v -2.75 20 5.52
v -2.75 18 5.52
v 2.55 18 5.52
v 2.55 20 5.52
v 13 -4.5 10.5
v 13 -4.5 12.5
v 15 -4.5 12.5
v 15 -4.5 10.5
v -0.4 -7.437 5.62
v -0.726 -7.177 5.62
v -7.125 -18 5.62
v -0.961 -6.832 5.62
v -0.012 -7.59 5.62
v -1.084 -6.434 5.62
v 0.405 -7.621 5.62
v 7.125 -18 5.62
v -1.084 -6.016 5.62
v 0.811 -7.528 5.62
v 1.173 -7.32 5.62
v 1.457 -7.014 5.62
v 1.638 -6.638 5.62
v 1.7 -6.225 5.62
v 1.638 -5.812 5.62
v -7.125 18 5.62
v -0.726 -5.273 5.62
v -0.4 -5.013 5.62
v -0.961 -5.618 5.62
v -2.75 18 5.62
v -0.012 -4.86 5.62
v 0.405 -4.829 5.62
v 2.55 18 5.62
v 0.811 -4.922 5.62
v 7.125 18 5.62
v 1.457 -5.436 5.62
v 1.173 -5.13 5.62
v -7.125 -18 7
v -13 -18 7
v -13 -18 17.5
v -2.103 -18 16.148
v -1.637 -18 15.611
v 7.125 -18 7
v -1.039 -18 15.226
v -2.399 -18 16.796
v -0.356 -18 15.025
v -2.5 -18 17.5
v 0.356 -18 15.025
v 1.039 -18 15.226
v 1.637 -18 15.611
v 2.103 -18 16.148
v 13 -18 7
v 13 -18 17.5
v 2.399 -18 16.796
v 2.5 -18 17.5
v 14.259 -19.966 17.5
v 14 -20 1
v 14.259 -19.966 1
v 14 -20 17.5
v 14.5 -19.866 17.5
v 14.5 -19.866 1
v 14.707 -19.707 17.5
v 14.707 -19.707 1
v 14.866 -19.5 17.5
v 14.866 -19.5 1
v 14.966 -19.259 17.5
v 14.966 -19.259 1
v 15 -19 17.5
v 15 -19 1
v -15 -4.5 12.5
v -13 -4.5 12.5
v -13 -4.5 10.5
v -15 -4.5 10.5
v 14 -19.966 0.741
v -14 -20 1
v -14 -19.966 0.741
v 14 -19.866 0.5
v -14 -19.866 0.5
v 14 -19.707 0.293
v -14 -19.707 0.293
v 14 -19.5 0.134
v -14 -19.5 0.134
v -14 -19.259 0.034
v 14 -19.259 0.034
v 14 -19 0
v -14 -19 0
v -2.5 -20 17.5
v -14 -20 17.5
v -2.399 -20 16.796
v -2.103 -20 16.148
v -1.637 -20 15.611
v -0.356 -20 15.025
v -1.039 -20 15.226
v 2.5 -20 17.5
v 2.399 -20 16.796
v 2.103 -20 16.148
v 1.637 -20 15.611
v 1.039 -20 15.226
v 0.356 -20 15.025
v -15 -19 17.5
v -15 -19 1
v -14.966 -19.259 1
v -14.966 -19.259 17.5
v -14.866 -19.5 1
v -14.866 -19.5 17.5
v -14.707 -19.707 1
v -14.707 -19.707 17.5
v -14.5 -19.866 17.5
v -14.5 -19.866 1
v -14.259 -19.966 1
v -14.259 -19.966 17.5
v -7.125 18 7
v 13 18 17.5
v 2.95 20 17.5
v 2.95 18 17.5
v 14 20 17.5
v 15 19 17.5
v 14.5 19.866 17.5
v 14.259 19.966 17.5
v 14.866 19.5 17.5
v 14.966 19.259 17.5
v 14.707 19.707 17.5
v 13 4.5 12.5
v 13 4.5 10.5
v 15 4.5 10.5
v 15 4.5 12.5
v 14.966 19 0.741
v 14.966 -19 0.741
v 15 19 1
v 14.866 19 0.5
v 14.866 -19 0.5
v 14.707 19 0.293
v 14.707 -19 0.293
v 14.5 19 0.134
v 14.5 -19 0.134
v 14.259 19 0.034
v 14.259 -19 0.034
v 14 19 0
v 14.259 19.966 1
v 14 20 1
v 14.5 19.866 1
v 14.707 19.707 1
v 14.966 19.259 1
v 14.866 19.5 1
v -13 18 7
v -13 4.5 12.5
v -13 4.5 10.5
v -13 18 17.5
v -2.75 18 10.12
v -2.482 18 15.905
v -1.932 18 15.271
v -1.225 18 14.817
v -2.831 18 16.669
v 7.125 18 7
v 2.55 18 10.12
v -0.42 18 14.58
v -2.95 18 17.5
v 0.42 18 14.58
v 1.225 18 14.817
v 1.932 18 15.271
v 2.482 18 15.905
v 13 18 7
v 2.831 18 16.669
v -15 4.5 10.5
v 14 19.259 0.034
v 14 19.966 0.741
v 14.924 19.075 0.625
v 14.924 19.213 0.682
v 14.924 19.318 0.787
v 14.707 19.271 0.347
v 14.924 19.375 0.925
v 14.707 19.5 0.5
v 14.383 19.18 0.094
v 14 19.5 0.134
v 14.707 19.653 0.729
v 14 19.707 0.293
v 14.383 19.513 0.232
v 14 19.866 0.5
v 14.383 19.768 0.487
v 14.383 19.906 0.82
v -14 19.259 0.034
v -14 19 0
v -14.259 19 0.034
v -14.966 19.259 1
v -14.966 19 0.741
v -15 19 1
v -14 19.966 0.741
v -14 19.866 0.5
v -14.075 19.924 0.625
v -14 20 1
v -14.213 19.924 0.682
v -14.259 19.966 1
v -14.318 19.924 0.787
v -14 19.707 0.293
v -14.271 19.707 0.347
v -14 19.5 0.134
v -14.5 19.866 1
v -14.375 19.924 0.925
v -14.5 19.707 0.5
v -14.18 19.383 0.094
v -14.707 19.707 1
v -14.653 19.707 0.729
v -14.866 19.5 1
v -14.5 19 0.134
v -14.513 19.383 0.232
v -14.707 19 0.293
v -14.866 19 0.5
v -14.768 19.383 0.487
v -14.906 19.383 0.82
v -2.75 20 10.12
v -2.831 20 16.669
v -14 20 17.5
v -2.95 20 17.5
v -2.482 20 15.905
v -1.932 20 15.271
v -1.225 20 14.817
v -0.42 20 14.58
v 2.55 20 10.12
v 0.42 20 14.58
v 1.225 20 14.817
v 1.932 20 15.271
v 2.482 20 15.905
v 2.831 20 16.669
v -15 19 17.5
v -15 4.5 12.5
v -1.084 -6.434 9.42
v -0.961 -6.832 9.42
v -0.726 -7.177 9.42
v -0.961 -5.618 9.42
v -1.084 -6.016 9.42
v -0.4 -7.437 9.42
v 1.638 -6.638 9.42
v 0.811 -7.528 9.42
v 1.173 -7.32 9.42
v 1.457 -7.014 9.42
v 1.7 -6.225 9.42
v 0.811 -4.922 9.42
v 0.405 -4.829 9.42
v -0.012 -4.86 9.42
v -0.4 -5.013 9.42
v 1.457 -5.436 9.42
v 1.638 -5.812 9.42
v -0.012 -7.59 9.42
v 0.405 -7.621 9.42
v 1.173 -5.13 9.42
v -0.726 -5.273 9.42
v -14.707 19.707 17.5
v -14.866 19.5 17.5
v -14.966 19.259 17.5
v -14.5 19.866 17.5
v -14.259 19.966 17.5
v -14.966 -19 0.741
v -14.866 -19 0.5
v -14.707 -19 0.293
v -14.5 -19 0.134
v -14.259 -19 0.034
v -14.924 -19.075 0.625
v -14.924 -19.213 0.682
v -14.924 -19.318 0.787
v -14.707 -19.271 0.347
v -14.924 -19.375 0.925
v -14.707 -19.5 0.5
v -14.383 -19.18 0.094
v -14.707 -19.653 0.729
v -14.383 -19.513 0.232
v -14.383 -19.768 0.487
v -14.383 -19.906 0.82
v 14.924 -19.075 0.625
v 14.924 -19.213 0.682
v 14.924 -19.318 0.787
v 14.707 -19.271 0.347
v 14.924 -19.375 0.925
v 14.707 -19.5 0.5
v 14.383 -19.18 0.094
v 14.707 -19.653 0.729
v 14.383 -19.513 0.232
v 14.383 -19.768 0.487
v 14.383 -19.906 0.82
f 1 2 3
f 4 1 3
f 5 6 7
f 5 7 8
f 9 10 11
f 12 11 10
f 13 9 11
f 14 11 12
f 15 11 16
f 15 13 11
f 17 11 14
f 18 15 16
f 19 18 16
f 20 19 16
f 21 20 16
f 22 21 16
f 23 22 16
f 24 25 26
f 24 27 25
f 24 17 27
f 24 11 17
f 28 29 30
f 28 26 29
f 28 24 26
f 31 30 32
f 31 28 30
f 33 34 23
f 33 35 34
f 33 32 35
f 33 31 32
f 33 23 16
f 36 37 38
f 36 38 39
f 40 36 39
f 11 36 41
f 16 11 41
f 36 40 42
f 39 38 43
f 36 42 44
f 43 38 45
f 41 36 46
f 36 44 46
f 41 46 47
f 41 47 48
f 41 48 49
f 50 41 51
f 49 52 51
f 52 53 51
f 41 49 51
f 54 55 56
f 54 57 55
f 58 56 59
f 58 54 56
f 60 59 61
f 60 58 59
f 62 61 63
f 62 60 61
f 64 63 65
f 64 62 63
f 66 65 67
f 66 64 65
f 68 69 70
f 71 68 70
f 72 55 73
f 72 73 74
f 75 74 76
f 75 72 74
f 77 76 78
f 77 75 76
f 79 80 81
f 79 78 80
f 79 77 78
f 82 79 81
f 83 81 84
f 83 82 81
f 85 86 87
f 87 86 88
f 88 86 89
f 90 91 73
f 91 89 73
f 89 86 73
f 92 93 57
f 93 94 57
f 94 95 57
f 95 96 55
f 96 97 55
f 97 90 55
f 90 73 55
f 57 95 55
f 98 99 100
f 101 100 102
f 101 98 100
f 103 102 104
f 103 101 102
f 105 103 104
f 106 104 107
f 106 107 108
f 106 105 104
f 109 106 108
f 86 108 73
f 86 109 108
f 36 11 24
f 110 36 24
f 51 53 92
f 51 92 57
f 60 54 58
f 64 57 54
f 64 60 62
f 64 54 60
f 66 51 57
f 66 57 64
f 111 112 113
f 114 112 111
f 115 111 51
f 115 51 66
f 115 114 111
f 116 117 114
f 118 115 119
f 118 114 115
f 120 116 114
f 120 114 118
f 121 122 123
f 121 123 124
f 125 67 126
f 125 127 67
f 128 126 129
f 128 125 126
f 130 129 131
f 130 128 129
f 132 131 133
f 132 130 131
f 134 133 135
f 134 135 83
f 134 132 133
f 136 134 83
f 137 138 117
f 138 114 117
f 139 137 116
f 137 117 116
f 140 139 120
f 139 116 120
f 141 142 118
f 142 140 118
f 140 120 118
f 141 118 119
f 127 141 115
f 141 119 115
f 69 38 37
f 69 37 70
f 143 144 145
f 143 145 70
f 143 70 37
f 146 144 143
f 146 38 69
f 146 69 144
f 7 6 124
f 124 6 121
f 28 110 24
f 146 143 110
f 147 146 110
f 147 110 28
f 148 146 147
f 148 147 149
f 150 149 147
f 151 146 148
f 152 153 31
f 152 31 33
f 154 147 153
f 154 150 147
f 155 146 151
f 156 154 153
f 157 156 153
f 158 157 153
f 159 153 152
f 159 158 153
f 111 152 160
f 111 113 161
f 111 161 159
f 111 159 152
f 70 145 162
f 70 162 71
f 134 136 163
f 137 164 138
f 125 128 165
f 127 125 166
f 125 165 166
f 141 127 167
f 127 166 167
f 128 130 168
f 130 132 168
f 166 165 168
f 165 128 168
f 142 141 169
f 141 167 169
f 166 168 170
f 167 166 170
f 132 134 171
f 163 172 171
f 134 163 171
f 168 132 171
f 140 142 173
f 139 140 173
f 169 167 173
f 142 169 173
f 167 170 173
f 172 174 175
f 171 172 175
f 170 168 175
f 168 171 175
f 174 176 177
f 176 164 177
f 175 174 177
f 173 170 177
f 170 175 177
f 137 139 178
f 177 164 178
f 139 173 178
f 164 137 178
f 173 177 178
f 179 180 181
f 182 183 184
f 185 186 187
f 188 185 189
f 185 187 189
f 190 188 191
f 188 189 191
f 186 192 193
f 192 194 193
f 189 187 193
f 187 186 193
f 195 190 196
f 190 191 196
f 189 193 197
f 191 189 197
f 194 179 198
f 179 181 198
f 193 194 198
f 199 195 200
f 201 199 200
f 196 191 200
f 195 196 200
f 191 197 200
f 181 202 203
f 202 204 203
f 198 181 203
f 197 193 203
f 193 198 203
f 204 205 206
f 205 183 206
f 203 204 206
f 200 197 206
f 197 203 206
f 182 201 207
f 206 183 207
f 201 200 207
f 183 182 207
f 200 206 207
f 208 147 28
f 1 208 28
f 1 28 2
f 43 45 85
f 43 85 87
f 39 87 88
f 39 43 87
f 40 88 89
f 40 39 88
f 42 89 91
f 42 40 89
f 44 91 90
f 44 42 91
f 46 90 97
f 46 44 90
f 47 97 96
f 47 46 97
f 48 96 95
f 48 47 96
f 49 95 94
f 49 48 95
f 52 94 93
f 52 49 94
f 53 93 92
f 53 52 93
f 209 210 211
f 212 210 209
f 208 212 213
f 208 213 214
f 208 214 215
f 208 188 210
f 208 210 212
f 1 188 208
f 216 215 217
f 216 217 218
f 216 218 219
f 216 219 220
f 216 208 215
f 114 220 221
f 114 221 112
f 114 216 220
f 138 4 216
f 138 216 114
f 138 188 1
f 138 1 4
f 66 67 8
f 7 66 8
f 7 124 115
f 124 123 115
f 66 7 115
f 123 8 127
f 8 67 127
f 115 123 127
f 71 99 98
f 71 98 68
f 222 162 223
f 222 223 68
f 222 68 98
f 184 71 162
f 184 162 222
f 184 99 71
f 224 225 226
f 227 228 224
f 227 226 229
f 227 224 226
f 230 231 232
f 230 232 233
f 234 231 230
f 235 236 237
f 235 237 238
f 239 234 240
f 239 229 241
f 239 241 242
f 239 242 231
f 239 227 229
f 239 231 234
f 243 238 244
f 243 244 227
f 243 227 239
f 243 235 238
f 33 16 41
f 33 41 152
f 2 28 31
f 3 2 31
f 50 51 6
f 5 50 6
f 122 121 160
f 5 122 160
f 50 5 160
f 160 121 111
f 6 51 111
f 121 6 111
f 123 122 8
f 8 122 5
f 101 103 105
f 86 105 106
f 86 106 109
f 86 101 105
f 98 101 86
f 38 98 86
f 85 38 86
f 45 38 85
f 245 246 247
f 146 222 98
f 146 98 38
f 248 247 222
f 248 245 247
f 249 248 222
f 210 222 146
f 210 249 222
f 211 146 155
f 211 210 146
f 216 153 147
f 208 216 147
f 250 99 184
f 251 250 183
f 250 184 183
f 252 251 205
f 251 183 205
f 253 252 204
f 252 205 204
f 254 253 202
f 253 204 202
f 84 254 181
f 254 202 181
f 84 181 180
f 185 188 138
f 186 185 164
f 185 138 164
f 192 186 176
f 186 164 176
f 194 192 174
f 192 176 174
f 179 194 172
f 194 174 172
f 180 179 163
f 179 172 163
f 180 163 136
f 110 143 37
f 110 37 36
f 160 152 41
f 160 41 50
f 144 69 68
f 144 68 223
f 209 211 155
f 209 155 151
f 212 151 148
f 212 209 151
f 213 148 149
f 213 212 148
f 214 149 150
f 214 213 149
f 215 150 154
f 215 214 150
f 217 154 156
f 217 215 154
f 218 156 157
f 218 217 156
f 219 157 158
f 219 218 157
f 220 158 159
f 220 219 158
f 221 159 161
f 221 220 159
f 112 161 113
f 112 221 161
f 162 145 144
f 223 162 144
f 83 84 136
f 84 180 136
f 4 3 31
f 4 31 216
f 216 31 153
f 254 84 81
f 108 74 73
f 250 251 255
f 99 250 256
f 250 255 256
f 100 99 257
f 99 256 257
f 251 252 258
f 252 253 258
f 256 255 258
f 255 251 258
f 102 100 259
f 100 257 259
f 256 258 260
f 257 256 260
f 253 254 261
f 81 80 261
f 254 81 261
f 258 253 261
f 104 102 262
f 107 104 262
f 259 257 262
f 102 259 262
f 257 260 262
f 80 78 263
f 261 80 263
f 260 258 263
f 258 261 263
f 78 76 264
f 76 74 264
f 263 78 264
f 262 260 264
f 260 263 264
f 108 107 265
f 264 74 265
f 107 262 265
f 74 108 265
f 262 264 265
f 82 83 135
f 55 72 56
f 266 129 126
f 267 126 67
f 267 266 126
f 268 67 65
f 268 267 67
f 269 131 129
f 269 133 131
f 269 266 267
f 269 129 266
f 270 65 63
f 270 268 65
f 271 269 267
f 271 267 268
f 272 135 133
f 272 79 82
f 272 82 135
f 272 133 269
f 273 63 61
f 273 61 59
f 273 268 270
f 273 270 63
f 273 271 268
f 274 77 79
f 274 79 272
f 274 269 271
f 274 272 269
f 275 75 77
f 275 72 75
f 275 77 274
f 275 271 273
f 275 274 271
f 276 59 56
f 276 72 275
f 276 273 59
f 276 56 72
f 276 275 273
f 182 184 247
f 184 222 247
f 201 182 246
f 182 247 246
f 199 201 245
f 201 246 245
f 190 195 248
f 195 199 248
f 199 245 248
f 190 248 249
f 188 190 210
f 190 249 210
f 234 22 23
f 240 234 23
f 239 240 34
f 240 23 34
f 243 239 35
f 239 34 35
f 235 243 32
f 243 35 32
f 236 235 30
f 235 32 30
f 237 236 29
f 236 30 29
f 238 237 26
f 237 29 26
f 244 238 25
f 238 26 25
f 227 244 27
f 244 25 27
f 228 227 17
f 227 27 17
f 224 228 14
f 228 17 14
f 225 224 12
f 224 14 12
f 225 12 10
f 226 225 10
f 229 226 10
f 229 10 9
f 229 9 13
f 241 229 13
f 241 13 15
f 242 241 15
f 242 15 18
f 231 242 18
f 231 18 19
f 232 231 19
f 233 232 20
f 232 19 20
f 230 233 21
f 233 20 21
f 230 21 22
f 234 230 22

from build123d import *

# Parameters (mm, degrees)
SKETCH1_W               = 30
SKETCH1_H               = 40
BOSS_EXTRUDE1_DEPTH     = 17.5
SKETCH2_W               = 26
SKETCH2_H               = 36
CUT_EXTRUDE1_DEPTH      = 15.5
BOSS_EXTRUDE2_DEPTH     = 3.62
CUT_EXTRUDE5_DEPTH      = 29
CUT_EXTRUDE5_DEPTH_BACK = 3
CUT_EXTRUDE6_DEPTH      = 3
SKETCH13_W              = 5.875
SKETCH13_H              = 36
BOSS_EXTRUDE4_DEPTH     = 5
CUT_EXTRUDE7_REACH      = 42
CUT_EXTRUDE8_DEPTH      = 3
SKETCH16_R              = 1.4
BOSS_EXTRUDE5_DEPTH     = 3.8
FILLET1_R               = 1


with BuildPart() as part:
    # Sketch1 → Boss-Extrude1 (new body)
    with BuildSketch(Plane.XY):
        Rectangle(SKETCH1_W, SKETCH1_H)
    extrude(amount=BOSS_EXTRUDE1_DEPTH)

    # Sketch2 → Cut-Extrude1 (cut)
    with BuildSketch(Plane.XY.offset(17.5)):
        Rectangle(SKETCH2_W, SKETCH2_H)
    extrude(amount=-CUT_EXTRUDE1_DEPTH, mode=Mode.SUBTRACT)

    # Sketch6 → Boss-Extrude2 (add)
    with BuildSketch(Plane.XY.offset(2)):
        Polygon((7.125, 18), (0, 18), (-7.125, 18), (-7.125, -13), (-7.125, -18), (7.125, -18), (7.125, -13), align=None)
    extrude(amount=BOSS_EXTRUDE2_DEPTH)

    # Sketch10 → Cut-Extrude5 (cut, two sides)
    with BuildSketch(Plane.ZY.offset(-13)) as cut_extrude5_sk:
        Polygon((12.5, 0), (12.5, -4.5), (10.5, -4.5), (10.5, 0), (10.5, 4.5), (12.5, 4.5), align=None)
    extrude(amount=CUT_EXTRUDE5_DEPTH, mode=Mode.SUBTRACT)
    extrude(cut_extrude5_sk.sketch, amount=-CUT_EXTRUDE5_DEPTH_BACK, mode=Mode.SUBTRACT)

    # Sketch12 → Cut-Extrude6 (cut, through all)
    with BuildSketch(Plane(origin=(0, -18, 0), x_dir=(1, 0, 0), z_dir=(0, 1, 0))):
        with BuildLine():
            Line((2.5, -17.5), (-2.5, -17.5))
            ThreePointArc((-2.5, -17.5), (0, -15), (2.5, -17.5))
        make_face()
    extrude(amount=-CUT_EXTRUDE6_DEPTH, mode=Mode.SUBTRACT)

    # Sketch13 → Boss-Extrude4 (add)
    with BuildSketch(Plane.XY.offset(2)):
        with Locations((-10.0625, 0)):
            Rectangle(SKETCH13_W, SKETCH13_H)
        with Locations((10.0625, 0)):
            Rectangle(SKETCH13_W, SKETCH13_H)
    extrude(amount=BOSS_EXTRUDE4_DEPTH)

    # Sketch14 → Cut-Extrude7 (cut, up to next)
    with BuildSketch(Plane(origin=(0, 20, 0), x_dir=(1, 0, 0), z_dir=(0, 1, 0)), mode=Mode.PRIVATE) as cut_extrude7_sk1:
        with BuildLine():
            Line((2.95, -17.5), (-2.95, -17.5))
            ThreePointArc((-2.95, -17.5), (0, -14.55), (2.95, -17.5))
        make_face()
    cut_extrude7_tool1 = extrude(cut_extrude7_sk1.sketch, amount=-CUT_EXTRUDE7_REACH, mode=Mode.PRIVATE) & part.part
    add(cut_extrude7_tool1.solids().sort_by_distance((0, 20, 16.247981))[0], mode=Mode.SUBTRACT)

    # Sketch15 → Cut-Extrude8 (cut, through all)
    with BuildSketch(Plane.XZ.offset(-18)):
        Polygon((-2.75, 10.12), (-2.75, 5.52), (2.55, 5.52), (2.55, 7.82), (2.55, 10.12), align=None)
    extrude(amount=-CUT_EXTRUDE8_DEPTH, mode=Mode.SUBTRACT)

    # Sketch16 → Boss-Extrude5 (add)
    with BuildSketch(Plane.XY.offset(5.62)):
        with Locations((0.3, -6.225)):
            Circle(SKETCH16_R)
    extrude(amount=BOSS_EXTRUDE5_DEPTH)

    # Fillet1
    fillet1_edges = [part.edges().sort_by_distance(p)[0] for p in [
        (0, -20, 0),
        (-15, 0, 0),
        (0, 20, 0),
        (15, 0, 0),
        (15, -20, 8.75),
        (-15, -20, 8.75),
        (-15, 20, 8.75),
        (15, 20, 8.75),
    ]]
    fillet(fillet1_edges, radius=FILLET1_R)


solid = part.part
